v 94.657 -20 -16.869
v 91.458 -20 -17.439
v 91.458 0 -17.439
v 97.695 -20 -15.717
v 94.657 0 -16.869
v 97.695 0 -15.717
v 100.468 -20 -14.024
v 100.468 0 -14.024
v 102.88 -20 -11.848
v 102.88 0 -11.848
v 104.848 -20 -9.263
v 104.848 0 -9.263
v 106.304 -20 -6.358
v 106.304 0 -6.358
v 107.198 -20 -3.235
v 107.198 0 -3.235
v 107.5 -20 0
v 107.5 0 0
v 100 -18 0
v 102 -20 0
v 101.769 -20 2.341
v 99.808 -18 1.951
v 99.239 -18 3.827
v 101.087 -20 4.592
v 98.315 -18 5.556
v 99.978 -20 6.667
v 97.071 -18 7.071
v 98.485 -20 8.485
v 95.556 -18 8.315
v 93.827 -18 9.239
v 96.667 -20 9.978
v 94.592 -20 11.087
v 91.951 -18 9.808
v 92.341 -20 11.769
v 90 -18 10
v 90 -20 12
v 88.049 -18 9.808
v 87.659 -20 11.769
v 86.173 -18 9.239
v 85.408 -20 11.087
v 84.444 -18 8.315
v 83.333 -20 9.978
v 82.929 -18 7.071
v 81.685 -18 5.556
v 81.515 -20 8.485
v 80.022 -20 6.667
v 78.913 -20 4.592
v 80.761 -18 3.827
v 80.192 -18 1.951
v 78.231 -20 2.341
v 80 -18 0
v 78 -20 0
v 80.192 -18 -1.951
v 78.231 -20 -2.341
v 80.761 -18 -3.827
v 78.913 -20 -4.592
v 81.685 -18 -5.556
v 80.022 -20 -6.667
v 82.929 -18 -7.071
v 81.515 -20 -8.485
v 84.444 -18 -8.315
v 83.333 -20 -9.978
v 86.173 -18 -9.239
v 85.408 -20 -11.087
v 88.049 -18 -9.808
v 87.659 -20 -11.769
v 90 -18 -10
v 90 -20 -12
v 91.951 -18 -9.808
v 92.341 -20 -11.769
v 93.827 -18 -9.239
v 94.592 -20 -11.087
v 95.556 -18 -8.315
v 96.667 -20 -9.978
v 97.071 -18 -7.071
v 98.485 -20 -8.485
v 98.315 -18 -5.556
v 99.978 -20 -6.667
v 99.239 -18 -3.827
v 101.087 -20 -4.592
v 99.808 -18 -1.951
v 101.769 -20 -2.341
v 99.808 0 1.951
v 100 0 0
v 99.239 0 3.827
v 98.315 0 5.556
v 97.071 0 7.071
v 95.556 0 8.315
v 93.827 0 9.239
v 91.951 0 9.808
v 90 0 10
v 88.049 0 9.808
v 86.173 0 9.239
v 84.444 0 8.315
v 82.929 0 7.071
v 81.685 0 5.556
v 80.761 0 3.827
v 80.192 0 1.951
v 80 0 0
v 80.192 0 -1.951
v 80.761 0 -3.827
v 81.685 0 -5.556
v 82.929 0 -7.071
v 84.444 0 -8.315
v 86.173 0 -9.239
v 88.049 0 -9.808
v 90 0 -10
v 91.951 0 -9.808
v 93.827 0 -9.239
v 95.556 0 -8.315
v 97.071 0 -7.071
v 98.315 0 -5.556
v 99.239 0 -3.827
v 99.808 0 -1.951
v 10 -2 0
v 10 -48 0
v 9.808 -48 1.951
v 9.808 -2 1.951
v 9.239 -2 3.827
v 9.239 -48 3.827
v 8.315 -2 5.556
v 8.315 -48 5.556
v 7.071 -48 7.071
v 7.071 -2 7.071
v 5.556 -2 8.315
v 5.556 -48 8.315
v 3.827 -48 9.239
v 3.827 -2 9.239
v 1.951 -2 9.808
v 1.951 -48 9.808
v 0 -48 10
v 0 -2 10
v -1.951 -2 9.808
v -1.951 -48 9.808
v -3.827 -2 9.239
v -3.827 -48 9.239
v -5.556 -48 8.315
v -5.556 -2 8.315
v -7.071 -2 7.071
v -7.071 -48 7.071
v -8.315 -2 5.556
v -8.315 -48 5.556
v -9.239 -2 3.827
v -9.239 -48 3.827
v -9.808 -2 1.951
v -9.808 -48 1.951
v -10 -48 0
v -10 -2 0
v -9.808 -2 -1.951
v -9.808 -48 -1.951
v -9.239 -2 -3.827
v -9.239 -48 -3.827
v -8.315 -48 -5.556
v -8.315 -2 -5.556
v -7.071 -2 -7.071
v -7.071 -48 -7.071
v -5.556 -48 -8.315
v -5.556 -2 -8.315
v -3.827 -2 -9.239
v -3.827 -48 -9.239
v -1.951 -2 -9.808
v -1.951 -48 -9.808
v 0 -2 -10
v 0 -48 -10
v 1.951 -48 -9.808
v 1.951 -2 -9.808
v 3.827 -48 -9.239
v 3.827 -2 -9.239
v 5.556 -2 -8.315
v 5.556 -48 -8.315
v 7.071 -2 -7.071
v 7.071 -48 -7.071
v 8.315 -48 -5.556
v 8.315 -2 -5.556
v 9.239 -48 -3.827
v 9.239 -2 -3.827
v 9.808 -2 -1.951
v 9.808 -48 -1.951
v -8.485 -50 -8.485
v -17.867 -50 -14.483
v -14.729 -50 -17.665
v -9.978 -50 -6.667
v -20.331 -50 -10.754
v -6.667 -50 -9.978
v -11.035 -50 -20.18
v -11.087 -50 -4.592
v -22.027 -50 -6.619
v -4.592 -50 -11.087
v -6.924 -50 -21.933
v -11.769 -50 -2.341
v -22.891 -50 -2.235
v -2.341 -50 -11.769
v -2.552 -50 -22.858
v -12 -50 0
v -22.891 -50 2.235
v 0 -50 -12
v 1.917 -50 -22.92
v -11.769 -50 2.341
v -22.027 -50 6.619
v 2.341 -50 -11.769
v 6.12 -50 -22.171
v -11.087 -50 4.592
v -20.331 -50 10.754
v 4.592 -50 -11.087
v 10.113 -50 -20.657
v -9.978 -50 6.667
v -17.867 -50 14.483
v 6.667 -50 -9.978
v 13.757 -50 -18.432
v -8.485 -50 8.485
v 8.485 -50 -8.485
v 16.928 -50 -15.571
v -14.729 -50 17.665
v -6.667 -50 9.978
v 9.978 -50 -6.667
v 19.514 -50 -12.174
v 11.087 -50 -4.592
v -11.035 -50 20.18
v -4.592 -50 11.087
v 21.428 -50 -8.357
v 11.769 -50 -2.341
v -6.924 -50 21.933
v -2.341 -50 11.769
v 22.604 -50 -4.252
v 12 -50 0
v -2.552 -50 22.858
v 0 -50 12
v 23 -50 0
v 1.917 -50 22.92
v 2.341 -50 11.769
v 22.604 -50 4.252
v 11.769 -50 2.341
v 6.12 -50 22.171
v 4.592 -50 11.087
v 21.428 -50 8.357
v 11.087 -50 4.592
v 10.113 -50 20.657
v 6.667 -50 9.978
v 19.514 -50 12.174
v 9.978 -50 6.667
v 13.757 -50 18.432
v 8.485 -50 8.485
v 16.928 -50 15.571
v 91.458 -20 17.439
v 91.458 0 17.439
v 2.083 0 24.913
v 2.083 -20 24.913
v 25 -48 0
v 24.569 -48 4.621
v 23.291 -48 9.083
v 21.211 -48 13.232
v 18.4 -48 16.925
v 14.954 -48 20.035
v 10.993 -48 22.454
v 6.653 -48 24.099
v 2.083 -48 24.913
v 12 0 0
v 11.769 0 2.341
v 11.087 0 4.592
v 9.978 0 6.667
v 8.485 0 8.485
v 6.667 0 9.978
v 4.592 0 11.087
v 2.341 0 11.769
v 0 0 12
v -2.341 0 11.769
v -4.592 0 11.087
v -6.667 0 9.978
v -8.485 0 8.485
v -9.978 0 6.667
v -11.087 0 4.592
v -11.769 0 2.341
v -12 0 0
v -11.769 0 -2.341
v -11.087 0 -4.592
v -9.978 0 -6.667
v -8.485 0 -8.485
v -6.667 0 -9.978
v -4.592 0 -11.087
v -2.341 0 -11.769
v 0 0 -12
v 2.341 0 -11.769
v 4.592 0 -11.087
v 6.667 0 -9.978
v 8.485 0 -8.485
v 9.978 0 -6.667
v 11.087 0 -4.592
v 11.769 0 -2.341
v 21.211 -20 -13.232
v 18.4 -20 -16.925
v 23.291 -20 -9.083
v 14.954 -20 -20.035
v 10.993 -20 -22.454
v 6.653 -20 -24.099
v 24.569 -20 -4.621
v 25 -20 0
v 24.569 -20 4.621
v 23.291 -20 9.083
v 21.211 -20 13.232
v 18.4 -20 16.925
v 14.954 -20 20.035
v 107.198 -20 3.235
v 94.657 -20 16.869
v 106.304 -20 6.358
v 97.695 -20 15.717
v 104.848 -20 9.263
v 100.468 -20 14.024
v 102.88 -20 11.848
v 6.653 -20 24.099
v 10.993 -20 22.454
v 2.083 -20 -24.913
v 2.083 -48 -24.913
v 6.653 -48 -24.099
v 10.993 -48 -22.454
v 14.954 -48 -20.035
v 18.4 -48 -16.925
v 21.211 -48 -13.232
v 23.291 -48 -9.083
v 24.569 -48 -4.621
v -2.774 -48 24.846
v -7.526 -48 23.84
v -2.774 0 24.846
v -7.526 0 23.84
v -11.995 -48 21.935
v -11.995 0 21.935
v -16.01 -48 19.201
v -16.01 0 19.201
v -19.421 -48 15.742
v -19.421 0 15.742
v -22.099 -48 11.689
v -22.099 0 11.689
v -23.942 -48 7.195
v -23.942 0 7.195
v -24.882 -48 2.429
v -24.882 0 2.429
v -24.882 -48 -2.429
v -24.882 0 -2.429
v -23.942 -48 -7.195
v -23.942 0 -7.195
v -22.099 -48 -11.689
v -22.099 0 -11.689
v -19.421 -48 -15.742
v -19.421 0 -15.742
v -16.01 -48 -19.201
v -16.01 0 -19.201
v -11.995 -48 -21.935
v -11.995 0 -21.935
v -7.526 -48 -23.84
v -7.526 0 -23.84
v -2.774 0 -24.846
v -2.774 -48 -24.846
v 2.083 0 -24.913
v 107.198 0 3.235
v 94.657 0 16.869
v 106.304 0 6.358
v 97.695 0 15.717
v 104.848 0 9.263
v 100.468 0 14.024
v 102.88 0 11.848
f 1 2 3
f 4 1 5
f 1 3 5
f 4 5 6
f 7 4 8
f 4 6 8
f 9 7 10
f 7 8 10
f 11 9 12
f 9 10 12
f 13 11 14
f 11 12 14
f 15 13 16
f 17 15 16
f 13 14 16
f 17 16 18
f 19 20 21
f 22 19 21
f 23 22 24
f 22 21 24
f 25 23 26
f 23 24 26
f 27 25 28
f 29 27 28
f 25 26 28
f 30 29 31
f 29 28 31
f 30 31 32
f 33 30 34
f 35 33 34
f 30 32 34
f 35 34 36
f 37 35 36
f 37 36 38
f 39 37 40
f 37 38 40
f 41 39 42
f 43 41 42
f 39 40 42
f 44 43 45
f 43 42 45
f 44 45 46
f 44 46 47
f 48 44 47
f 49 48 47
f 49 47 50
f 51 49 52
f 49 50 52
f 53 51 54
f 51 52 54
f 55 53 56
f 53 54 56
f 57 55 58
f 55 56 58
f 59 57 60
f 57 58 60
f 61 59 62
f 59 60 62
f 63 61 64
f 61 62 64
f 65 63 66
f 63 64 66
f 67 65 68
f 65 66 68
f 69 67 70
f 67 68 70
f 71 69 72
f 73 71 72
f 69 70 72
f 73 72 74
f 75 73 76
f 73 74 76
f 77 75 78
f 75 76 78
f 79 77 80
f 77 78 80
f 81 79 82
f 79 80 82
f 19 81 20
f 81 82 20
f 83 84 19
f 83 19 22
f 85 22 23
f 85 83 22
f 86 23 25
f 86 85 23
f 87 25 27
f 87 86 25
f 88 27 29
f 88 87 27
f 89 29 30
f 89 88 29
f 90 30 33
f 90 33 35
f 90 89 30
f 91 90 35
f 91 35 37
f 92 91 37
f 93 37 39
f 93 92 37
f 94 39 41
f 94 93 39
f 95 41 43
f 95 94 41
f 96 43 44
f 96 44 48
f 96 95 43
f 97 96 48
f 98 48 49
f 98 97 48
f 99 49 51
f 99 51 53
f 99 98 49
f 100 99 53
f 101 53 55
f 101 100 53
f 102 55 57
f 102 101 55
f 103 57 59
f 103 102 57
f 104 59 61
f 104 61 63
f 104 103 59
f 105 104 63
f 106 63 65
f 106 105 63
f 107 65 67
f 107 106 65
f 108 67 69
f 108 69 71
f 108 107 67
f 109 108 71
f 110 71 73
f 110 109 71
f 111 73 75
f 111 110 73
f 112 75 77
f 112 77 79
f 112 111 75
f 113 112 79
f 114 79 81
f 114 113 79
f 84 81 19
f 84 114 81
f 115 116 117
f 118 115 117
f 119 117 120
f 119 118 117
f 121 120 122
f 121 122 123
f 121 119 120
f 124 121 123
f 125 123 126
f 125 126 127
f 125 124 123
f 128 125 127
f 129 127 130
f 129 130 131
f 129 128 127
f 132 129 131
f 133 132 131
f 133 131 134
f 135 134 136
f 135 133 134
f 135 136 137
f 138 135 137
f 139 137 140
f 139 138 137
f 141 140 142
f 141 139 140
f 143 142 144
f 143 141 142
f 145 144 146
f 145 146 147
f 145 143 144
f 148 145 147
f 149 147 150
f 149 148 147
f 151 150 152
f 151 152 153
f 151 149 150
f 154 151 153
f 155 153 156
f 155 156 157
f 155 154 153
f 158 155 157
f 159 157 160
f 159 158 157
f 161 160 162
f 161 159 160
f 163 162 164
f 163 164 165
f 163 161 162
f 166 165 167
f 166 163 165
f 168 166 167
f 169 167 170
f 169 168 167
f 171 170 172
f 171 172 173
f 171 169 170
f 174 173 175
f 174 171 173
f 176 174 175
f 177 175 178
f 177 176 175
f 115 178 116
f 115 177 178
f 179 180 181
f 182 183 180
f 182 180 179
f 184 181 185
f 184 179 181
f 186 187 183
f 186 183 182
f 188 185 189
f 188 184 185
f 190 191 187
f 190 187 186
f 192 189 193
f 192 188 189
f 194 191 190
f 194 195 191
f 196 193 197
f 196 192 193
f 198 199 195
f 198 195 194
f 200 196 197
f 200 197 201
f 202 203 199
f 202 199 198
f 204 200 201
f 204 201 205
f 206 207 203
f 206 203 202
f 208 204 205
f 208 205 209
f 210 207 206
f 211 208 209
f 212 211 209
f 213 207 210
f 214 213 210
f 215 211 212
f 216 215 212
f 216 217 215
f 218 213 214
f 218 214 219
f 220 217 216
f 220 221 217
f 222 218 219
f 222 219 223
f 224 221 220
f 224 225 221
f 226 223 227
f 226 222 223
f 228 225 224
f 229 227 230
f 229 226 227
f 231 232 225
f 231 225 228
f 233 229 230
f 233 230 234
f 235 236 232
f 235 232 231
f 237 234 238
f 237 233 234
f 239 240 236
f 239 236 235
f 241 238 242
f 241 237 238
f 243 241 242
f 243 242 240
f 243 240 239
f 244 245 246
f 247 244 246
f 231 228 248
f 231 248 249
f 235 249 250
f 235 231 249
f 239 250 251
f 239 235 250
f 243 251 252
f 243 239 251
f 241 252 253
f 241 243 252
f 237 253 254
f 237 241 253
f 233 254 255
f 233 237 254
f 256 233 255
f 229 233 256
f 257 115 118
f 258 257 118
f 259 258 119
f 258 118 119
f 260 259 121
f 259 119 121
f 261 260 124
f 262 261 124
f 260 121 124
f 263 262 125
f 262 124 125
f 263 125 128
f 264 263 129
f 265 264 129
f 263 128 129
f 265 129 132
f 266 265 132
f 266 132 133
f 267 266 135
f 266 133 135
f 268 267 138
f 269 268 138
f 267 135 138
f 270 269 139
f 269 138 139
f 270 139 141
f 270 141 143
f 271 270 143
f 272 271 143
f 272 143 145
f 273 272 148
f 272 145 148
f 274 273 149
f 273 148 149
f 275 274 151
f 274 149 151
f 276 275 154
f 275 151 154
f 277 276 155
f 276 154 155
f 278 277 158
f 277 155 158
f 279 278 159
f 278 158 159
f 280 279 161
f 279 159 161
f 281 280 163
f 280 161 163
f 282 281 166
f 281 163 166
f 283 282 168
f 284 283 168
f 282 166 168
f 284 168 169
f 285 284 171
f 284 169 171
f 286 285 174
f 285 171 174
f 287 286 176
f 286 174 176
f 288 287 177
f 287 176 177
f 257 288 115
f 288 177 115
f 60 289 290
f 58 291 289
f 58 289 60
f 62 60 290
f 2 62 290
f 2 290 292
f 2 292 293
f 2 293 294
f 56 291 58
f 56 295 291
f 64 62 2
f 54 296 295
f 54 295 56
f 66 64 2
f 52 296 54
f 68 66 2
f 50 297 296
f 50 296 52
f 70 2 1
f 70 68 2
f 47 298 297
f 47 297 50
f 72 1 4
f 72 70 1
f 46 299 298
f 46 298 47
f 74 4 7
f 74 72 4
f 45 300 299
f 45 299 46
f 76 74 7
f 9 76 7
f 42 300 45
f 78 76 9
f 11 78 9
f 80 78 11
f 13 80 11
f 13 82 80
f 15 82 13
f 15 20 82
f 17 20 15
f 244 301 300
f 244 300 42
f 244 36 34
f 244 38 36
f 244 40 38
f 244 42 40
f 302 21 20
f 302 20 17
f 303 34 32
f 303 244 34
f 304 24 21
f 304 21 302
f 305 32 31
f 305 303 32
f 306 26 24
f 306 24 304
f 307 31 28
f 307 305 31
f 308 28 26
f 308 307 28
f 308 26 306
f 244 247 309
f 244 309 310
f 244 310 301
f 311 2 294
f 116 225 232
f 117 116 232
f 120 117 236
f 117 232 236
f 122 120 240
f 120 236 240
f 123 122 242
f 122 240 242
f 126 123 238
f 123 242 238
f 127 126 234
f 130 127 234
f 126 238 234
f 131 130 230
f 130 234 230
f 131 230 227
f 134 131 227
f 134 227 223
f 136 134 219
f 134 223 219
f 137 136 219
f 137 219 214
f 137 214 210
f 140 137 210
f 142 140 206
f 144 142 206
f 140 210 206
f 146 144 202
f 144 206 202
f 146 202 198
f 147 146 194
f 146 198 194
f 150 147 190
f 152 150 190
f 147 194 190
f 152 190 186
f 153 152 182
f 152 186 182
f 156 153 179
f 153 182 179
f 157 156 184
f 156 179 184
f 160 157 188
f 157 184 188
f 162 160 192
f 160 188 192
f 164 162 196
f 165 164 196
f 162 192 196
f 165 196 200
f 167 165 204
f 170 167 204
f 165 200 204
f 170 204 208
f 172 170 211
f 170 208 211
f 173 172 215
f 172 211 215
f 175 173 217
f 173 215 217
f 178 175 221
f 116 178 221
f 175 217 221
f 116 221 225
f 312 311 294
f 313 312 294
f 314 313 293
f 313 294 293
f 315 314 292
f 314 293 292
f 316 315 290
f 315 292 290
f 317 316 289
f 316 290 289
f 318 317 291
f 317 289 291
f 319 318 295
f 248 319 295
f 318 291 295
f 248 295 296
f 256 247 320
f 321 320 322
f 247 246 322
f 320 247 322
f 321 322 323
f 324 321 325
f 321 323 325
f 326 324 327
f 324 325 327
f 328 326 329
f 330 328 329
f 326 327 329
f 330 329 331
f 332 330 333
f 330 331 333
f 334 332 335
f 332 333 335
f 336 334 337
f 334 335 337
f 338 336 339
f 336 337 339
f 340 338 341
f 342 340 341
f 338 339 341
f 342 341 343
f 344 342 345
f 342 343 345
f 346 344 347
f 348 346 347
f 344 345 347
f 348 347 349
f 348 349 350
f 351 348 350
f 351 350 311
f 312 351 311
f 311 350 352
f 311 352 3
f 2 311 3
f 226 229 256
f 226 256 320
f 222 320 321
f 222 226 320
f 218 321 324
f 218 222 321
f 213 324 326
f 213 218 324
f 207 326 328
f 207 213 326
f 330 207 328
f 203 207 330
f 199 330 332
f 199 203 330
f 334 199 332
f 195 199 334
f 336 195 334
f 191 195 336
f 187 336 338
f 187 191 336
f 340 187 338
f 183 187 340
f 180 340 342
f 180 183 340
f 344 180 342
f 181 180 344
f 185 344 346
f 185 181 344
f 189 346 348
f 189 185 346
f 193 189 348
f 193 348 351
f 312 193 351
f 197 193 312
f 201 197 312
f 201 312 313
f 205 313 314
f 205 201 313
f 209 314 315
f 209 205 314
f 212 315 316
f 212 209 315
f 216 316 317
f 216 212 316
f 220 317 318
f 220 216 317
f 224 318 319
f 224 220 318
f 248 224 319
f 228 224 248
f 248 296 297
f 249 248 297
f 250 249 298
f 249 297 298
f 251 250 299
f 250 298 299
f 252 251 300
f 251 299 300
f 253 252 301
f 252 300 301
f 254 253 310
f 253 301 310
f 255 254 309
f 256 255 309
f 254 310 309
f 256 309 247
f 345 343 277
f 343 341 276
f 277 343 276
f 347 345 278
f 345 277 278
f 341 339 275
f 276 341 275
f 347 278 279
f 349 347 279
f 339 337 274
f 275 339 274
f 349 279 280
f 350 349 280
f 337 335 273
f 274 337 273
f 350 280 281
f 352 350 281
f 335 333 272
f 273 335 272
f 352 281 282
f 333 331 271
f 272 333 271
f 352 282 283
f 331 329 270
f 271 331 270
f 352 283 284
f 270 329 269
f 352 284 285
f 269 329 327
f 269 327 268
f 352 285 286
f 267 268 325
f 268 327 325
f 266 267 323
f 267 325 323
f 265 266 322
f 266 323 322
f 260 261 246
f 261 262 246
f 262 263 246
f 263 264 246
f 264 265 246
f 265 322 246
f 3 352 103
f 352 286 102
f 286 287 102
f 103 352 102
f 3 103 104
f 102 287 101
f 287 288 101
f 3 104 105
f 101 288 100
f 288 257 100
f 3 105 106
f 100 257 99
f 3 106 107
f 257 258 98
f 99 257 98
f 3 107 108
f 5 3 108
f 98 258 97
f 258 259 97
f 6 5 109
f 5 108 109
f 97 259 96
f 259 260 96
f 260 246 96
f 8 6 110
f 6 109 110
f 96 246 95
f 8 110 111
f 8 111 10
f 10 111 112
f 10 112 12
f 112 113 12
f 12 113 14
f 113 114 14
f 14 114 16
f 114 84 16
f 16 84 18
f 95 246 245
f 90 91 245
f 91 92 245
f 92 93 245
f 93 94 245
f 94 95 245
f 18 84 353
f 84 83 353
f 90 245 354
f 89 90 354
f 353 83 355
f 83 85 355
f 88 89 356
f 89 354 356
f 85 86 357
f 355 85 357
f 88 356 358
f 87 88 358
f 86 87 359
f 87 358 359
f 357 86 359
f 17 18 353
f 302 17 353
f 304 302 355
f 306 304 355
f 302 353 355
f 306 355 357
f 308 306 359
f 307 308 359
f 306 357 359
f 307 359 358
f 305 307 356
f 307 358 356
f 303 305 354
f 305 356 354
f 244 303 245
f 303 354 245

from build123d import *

# Parameters (mm, degrees)
F0_R     = 10
F1_DEPTH = 20
F2_DEPTH = 50
F3_SIZE  = 2


with BuildPart() as f1:
    # F0 (on Front) → F1 (new body)
    with BuildSketch(Plane.XZ):
        with BuildLine():
            ThreePointArc((2.083333, -24.913043), (18.399502, -16.92508), (25, 0))
            ThreePointArc((25, 0), (18.399502, 16.92508), (2.083333, 24.913043))
            ThreePointArc((2.083333, 24.913043), (-25, 0), (2.083333, -24.913043))
        make_face()
        Circle(F0_R, mode=Mode.SUBTRACT)
        with BuildLine():
            ThreePointArc((2.083333, 24.913043), (18.399502, 16.92508), (25, 0))
            ThreePointArc((25, 0), (18.399502, -16.92508), (2.083333, -24.913043))
            Line((2.083333, -24.913043), (91.458333, -17.43913))
            ThreePointArc((91.458333, -17.43913), (72.5, 0), (91.458333, 17.43913))
            Line((91.458333, 17.43913), (2.083333, 24.913043))
        make_face()
        with BuildLine():
            ThreePointArc((107.5, 0), (102.879651, 11.847556), (91.458333, 17.43913))
            ThreePointArc((91.458333, 17.43913), (72.5, 0), (91.458333, -17.43913))
            ThreePointArc((91.458333, -17.43913), (102.879651, -11.847556), (107.5, 0))
        make_face()
        with Locations((90, 0)):
            Circle(F0_R, mode=Mode.SUBTRACT)
    extrude(amount=F1_DEPTH)

    # F0 (on Front) → F2 (join)
    with BuildSketch(Plane.XZ):
        with BuildLine():
            ThreePointArc((2.083333, -24.913043), (18.399502, -16.92508), (25, 0))
            ThreePointArc((25, 0), (18.399502, 16.92508), (2.083333, 24.913043))
            ThreePointArc((2.083333, 24.913043), (-25, 0), (2.083333, -24.913043))
        make_face()
        Circle(F0_R, mode=Mode.SUBTRACT)
    extrude(amount=F2_DEPTH)

    # F3
    f3_edges = [f1.edges().sort_by_distance(p)[0] for p in [
        (-10, 0, 0),
        (10, -25, 0),
        (-10, -50, 0),
        (-2.083333, -50, 24.913043),
        (80, -20, 0),
    ]]
    chamfer(f3_edges, length=F3_SIZE)


solid = f1.part
